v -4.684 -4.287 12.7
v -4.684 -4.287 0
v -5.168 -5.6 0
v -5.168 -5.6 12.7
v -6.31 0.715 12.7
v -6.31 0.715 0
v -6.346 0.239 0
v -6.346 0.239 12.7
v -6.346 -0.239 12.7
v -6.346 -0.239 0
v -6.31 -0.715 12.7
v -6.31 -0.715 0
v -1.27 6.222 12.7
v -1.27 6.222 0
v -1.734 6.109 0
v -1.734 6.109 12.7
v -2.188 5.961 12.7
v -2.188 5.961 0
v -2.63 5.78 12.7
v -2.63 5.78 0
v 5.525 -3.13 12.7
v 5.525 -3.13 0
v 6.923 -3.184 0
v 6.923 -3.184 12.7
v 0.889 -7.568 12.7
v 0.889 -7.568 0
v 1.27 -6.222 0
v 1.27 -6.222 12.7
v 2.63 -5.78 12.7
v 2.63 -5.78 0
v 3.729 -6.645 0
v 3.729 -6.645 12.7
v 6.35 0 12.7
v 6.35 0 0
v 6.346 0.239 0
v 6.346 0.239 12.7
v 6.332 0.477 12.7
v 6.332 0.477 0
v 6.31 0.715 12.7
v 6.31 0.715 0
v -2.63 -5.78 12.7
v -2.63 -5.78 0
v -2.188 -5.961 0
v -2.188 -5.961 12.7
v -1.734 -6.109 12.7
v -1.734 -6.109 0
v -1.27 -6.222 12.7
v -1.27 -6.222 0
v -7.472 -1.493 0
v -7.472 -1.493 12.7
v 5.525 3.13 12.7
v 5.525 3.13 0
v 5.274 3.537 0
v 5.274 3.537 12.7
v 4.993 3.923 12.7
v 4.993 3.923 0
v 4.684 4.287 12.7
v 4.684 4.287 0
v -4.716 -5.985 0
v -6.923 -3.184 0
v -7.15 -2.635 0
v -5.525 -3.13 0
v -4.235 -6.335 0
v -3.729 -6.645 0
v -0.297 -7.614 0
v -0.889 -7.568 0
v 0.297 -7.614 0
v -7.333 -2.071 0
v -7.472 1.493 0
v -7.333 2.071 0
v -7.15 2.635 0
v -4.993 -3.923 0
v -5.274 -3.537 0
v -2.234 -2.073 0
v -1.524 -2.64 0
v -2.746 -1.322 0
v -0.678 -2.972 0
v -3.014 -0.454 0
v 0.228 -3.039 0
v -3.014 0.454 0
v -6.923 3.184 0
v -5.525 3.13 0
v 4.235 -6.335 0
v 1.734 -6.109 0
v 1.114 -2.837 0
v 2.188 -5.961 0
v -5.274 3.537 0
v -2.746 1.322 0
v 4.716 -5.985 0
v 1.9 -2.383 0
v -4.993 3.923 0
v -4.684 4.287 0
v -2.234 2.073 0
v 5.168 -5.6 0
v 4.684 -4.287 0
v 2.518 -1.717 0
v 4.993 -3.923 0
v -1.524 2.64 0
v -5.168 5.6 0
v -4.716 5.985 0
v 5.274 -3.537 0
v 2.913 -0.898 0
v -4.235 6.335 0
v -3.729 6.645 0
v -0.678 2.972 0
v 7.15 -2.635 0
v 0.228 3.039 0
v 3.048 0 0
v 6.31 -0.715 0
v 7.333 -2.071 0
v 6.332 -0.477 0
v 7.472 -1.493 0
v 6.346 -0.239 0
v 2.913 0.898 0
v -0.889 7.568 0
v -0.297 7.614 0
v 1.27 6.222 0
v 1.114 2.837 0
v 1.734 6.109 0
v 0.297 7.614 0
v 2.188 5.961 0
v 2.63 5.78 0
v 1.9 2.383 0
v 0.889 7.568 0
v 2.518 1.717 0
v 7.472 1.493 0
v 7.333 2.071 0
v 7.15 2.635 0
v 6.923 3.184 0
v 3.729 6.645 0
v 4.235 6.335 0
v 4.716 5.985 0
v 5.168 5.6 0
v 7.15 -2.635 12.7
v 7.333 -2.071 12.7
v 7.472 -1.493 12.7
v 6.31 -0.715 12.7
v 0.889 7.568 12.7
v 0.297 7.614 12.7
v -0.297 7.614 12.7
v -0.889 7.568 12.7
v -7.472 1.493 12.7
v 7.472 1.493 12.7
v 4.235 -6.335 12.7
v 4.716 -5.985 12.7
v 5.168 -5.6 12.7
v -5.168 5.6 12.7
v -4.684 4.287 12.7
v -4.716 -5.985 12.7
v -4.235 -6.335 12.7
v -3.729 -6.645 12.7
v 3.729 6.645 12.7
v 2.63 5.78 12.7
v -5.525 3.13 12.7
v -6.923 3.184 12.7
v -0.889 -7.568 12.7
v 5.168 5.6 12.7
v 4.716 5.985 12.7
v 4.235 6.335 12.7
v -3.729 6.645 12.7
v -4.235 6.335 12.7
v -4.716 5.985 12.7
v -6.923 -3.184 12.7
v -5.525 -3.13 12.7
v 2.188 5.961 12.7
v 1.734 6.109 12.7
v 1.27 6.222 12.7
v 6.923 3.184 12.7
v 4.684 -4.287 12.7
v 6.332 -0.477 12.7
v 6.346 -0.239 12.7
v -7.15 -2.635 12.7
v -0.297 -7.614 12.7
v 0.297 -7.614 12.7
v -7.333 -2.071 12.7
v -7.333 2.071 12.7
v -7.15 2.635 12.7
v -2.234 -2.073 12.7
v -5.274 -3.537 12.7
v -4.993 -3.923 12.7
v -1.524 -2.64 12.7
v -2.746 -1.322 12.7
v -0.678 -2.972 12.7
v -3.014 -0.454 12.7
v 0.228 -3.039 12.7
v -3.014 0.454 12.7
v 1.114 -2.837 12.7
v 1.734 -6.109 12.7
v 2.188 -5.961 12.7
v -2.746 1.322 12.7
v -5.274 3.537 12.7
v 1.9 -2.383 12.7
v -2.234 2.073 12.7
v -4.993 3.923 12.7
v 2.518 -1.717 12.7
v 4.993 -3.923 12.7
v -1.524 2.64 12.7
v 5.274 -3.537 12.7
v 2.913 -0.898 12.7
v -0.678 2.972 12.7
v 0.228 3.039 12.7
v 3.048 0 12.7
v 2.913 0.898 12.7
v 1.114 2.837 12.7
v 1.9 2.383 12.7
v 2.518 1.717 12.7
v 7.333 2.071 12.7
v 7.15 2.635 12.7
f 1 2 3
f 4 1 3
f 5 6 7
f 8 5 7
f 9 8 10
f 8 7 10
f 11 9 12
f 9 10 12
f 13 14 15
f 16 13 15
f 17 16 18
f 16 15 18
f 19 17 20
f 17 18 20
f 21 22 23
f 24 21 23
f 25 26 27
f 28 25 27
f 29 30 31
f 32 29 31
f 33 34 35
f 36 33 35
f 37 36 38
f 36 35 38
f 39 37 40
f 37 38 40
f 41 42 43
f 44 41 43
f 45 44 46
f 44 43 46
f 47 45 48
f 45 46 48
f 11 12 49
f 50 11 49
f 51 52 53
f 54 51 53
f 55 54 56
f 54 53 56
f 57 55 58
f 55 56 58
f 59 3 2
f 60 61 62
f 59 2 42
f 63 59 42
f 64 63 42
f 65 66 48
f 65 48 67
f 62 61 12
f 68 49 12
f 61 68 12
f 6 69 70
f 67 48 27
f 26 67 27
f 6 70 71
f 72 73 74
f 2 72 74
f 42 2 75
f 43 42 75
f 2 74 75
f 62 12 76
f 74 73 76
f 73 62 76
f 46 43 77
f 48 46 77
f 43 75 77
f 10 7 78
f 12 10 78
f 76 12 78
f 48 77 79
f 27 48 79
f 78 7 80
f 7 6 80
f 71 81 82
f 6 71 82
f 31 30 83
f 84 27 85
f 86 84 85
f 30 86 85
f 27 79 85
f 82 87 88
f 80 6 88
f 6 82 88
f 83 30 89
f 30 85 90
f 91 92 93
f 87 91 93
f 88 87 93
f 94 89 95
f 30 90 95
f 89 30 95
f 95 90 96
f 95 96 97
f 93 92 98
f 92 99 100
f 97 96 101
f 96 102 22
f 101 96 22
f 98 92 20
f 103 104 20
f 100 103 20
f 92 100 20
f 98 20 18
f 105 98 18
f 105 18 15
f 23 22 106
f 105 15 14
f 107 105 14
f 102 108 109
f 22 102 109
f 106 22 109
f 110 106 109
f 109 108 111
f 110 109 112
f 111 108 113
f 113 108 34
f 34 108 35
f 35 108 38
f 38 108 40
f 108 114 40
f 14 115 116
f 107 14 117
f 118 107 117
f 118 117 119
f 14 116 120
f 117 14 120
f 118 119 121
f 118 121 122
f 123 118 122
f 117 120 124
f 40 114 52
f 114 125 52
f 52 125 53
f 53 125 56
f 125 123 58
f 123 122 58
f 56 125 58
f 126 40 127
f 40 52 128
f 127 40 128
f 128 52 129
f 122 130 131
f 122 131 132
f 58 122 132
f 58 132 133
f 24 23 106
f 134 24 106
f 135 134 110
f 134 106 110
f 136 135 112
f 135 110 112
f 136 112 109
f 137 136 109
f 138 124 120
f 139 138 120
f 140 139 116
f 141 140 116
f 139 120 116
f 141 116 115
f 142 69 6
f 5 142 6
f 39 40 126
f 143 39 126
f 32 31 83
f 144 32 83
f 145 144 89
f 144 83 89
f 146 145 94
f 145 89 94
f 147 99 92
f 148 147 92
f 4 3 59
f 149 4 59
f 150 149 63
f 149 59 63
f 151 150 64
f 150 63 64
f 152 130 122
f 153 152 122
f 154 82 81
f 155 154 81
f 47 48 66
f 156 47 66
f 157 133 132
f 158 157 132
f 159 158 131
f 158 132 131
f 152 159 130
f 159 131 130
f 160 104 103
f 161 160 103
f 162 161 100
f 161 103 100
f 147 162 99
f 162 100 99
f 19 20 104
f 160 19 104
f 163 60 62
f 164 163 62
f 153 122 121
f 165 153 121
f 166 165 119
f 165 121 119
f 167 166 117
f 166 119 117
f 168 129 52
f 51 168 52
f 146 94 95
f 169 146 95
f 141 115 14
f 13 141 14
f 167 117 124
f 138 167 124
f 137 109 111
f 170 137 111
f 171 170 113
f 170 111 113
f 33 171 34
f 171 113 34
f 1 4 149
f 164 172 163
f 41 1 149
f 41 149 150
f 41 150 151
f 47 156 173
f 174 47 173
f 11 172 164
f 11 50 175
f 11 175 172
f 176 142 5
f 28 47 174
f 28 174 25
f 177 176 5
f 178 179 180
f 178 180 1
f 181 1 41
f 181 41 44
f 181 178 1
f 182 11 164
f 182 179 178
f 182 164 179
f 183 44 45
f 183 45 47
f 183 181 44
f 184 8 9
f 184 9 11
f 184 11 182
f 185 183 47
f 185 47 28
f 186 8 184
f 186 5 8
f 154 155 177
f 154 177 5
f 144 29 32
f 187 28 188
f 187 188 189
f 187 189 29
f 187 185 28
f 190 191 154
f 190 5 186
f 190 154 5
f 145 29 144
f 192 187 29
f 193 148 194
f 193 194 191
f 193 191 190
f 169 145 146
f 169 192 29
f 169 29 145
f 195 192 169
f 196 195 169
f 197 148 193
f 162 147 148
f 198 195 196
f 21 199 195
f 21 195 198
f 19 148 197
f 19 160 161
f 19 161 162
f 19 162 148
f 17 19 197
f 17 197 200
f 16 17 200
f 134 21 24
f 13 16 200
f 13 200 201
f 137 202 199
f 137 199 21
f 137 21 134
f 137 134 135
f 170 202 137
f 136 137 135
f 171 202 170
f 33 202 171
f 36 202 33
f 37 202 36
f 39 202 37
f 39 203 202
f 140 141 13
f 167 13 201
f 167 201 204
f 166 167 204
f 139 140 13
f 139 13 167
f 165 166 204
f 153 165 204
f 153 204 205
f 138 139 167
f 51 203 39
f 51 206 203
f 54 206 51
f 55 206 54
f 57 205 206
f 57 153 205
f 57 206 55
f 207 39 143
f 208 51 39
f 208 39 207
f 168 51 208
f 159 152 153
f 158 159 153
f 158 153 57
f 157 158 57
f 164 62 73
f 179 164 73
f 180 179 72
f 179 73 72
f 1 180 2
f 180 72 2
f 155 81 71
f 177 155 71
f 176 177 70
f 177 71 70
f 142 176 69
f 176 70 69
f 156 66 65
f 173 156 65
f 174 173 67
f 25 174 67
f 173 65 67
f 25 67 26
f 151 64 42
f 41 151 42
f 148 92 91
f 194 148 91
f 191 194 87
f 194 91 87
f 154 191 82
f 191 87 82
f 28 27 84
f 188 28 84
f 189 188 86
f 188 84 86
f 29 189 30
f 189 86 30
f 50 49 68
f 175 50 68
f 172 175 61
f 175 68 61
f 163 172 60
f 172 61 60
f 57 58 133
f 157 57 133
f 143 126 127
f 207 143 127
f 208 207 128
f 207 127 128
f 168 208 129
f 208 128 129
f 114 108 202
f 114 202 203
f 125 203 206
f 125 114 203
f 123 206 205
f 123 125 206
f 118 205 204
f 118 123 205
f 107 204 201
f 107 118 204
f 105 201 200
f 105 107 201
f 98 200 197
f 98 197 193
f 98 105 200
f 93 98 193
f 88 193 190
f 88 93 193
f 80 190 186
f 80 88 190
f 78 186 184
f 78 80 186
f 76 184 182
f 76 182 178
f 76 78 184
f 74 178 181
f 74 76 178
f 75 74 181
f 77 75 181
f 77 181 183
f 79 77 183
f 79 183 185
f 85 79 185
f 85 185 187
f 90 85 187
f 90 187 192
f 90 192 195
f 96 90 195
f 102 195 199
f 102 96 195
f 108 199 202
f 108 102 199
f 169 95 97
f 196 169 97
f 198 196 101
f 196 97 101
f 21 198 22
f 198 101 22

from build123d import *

# Parameters (mm, degrees)
F0_R     = 3.048
F1_DEPTH = 12.7


with BuildPart() as f1:
    # F0 (on Top) → F1 (new body)
    with BuildSketch(Plane.XY):
        with BuildLine():
            Line((6.309644, 0.71477), (7.472278, 1.49314))
            ThreePointArc((7.472278, 1.49314), (7.247051, 2.354709), (6.922845, 3.184119))
            Line((6.922845, 3.184119), (5.52474, 3.130454))
            ThreePointArc((5.52474, 3.130454), (6.039209, 1.962258), (6.309644, 0.71477))
        make_face()
        with BuildLine():
            Line((4.684477, 4.286977), (5.167554, 5.60007))
            ThreePointArc((5.167554, 5.60007), (4.478924, 6.164709), (3.729122, 6.645153))
            Line((3.729122, 6.645153), (2.629574, 5.779951))
            ThreePointArc((2.629574, 5.779951), (3.732436, 5.137258), (4.684477, 4.286977))
        make_face()
        with BuildLine():
            Line((1.27, 6.221704), (0.889, 7.567964))
            ThreePointArc((0.889, 7.567964), (0, 7.62), (-0.889, 7.567964))
            Line((-0.889, 7.567964), (-1.27, 6.221704))
            ThreePointArc((-1.27, 6.221704), (0, 6.35), (1.27, 6.221704))
        make_face()
        with BuildLine():
            Line((-2.629574, 5.779951), (-3.729122, 6.645153))
            ThreePointArc((-3.729122, 6.645153), (-4.478924, 6.164709), (-5.167554, 5.60007))
            Line((-5.167554, 5.60007), (-4.684477, 4.286977))
            ThreePointArc((-4.684477, 4.286977), (-3.732436, 5.137258), (-2.629574, 5.779951))
        make_face()
        with BuildLine():
            Line((-5.52474, 3.130454), (-6.922845, 3.184119))
            ThreePointArc((-6.922845, 3.184119), (-7.247051, 2.354709), (-7.472278, 1.49314))
            Line((-7.472278, 1.49314), (-6.309644, 0.71477))
            ThreePointArc((-6.309644, 0.71477), (-6.039209, 1.962258), (-5.52474, 3.130454))
        make_face()
        with BuildLine():
            ThreePointArc((-7.472278, -1.49314), (-7.247051, -2.354709), (-6.922845, -3.184119))
            Line((-6.922845, -3.184119), (-5.52474, -3.130454))
            ThreePointArc((-5.52474, -3.130454), (-6.039209, -1.962258), (-6.309644, -0.71477))
            Line((-6.309644, -0.71477), (-7.472278, -1.49314))
        make_face()
        with BuildLine():
            ThreePointArc((-5.167554, -5.60007), (-4.478924, -6.164709), (-3.729122, -6.645153))
            Line((-3.729122, -6.645153), (-2.629574, -5.779951))
            ThreePointArc((-2.629574, -5.779951), (-3.732436, -5.137258), (-4.684477, -4.286977))
            Line((-4.684477, -4.286977), (-5.167554, -5.60007))
        make_face()
        with BuildLine():
            ThreePointArc((-0.889, -7.567964), (0, -7.62), (0.889, -7.567964))
            Line((0.889, -7.567964), (1.27, -6.221704))
            ThreePointArc((1.27, -6.221704), (0, -6.35), (-1.27, -6.221704))
            Line((-1.27, -6.221704), (-0.889, -7.567964))
        make_face()
        with BuildLine():
            ThreePointArc((3.729122, -6.645153), (4.478924, -6.164709), (5.167554, -5.60007))
            Line((5.167554, -5.60007), (4.684477, -4.286977))
            ThreePointArc((4.684477, -4.286977), (3.732436, -5.137258), (2.629574, -5.779951))
            Line((2.629574, -5.779951), (3.729122, -6.645153))
        make_face()
        with BuildLine():
            ThreePointArc((6.922845, -3.184119), (7.247051, -2.354709), (7.472278, -1.49314))
            Line((7.472278, -1.49314), (6.309644, -0.71477))
            ThreePointArc((6.309644, -0.71477), (6.039209, -1.962258), (5.52474, -3.130454))
            Line((5.52474, -3.130454), (6.922845, -3.184119))
        make_face()
        with BuildLine():
            ThreePointArc((6.35, 0), (6.339903, 0.357954), (6.309644, 0.71477))
            ThreePointArc((6.309644, 0.71477), (6.039209, 1.962258), (5.52474, 3.130454))
            ThreePointArc((5.52474, 3.130454), (5.137258, 3.732436), (4.684477, 4.286977))
            ThreePointArc((4.684477, 4.286977), (3.732436, 5.137258), (2.629574, 5.779951))
            ThreePointArc((2.629574, 5.779951), (1.962258, 6.039209), (1.27, 6.221704))
            ThreePointArc((1.27, 6.221704), (0, 6.35), (-1.27, 6.221704))
            ThreePointArc((-1.27, 6.221704), (-1.962258, 6.039209), (-2.629574, 5.779951))
            ThreePointArc((-2.629574, 5.779951), (-3.732436, 5.137258), (-4.684477, 4.286977))
            ThreePointArc((-4.684477, 4.286977), (-5.137258, 3.732436), (-5.52474, 3.130454))
            ThreePointArc((-5.52474, 3.130454), (-6.039209, 1.962258), (-6.309644, 0.71477))
            ThreePointArc((-6.309644, 0.71477), (-6.35, 0), (-6.309644, -0.71477))
            ThreePointArc((-6.309644, -0.71477), (-6.039209, -1.962258), (-5.52474, -3.130454))
            ThreePointArc((-5.52474, -3.130454), (-5.137258, -3.732436), (-4.684477, -4.286977))
            ThreePointArc((-4.684477, -4.286977), (-3.732436, -5.137258), (-2.629574, -5.779951))
            ThreePointArc((-2.629574, -5.779951), (-1.962258, -6.039209), (-1.27, -6.221704))
            ThreePointArc((-1.27, -6.221704), (0, -6.35), (1.27, -6.221704))
            ThreePointArc((1.27, -6.221704), (1.962258, -6.039209), (2.629574, -5.779951))
            ThreePointArc((2.629574, -5.779951), (3.732436, -5.137258), (4.684477, -4.286977))
            ThreePointArc((4.684477, -4.286977), (5.137258, -3.732436), (5.52474, -3.130454))
            ThreePointArc((5.52474, -3.130454), (6.039209, -1.962258), (6.309644, -0.71477))
            ThreePointArc((6.309644, -0.71477), (6.339903, -0.357954), (6.35, 0))
        make_face()
        Circle(F0_R, mode=Mode.SUBTRACT)
    extrude(amount=F1_DEPTH)


solid = f1.part
